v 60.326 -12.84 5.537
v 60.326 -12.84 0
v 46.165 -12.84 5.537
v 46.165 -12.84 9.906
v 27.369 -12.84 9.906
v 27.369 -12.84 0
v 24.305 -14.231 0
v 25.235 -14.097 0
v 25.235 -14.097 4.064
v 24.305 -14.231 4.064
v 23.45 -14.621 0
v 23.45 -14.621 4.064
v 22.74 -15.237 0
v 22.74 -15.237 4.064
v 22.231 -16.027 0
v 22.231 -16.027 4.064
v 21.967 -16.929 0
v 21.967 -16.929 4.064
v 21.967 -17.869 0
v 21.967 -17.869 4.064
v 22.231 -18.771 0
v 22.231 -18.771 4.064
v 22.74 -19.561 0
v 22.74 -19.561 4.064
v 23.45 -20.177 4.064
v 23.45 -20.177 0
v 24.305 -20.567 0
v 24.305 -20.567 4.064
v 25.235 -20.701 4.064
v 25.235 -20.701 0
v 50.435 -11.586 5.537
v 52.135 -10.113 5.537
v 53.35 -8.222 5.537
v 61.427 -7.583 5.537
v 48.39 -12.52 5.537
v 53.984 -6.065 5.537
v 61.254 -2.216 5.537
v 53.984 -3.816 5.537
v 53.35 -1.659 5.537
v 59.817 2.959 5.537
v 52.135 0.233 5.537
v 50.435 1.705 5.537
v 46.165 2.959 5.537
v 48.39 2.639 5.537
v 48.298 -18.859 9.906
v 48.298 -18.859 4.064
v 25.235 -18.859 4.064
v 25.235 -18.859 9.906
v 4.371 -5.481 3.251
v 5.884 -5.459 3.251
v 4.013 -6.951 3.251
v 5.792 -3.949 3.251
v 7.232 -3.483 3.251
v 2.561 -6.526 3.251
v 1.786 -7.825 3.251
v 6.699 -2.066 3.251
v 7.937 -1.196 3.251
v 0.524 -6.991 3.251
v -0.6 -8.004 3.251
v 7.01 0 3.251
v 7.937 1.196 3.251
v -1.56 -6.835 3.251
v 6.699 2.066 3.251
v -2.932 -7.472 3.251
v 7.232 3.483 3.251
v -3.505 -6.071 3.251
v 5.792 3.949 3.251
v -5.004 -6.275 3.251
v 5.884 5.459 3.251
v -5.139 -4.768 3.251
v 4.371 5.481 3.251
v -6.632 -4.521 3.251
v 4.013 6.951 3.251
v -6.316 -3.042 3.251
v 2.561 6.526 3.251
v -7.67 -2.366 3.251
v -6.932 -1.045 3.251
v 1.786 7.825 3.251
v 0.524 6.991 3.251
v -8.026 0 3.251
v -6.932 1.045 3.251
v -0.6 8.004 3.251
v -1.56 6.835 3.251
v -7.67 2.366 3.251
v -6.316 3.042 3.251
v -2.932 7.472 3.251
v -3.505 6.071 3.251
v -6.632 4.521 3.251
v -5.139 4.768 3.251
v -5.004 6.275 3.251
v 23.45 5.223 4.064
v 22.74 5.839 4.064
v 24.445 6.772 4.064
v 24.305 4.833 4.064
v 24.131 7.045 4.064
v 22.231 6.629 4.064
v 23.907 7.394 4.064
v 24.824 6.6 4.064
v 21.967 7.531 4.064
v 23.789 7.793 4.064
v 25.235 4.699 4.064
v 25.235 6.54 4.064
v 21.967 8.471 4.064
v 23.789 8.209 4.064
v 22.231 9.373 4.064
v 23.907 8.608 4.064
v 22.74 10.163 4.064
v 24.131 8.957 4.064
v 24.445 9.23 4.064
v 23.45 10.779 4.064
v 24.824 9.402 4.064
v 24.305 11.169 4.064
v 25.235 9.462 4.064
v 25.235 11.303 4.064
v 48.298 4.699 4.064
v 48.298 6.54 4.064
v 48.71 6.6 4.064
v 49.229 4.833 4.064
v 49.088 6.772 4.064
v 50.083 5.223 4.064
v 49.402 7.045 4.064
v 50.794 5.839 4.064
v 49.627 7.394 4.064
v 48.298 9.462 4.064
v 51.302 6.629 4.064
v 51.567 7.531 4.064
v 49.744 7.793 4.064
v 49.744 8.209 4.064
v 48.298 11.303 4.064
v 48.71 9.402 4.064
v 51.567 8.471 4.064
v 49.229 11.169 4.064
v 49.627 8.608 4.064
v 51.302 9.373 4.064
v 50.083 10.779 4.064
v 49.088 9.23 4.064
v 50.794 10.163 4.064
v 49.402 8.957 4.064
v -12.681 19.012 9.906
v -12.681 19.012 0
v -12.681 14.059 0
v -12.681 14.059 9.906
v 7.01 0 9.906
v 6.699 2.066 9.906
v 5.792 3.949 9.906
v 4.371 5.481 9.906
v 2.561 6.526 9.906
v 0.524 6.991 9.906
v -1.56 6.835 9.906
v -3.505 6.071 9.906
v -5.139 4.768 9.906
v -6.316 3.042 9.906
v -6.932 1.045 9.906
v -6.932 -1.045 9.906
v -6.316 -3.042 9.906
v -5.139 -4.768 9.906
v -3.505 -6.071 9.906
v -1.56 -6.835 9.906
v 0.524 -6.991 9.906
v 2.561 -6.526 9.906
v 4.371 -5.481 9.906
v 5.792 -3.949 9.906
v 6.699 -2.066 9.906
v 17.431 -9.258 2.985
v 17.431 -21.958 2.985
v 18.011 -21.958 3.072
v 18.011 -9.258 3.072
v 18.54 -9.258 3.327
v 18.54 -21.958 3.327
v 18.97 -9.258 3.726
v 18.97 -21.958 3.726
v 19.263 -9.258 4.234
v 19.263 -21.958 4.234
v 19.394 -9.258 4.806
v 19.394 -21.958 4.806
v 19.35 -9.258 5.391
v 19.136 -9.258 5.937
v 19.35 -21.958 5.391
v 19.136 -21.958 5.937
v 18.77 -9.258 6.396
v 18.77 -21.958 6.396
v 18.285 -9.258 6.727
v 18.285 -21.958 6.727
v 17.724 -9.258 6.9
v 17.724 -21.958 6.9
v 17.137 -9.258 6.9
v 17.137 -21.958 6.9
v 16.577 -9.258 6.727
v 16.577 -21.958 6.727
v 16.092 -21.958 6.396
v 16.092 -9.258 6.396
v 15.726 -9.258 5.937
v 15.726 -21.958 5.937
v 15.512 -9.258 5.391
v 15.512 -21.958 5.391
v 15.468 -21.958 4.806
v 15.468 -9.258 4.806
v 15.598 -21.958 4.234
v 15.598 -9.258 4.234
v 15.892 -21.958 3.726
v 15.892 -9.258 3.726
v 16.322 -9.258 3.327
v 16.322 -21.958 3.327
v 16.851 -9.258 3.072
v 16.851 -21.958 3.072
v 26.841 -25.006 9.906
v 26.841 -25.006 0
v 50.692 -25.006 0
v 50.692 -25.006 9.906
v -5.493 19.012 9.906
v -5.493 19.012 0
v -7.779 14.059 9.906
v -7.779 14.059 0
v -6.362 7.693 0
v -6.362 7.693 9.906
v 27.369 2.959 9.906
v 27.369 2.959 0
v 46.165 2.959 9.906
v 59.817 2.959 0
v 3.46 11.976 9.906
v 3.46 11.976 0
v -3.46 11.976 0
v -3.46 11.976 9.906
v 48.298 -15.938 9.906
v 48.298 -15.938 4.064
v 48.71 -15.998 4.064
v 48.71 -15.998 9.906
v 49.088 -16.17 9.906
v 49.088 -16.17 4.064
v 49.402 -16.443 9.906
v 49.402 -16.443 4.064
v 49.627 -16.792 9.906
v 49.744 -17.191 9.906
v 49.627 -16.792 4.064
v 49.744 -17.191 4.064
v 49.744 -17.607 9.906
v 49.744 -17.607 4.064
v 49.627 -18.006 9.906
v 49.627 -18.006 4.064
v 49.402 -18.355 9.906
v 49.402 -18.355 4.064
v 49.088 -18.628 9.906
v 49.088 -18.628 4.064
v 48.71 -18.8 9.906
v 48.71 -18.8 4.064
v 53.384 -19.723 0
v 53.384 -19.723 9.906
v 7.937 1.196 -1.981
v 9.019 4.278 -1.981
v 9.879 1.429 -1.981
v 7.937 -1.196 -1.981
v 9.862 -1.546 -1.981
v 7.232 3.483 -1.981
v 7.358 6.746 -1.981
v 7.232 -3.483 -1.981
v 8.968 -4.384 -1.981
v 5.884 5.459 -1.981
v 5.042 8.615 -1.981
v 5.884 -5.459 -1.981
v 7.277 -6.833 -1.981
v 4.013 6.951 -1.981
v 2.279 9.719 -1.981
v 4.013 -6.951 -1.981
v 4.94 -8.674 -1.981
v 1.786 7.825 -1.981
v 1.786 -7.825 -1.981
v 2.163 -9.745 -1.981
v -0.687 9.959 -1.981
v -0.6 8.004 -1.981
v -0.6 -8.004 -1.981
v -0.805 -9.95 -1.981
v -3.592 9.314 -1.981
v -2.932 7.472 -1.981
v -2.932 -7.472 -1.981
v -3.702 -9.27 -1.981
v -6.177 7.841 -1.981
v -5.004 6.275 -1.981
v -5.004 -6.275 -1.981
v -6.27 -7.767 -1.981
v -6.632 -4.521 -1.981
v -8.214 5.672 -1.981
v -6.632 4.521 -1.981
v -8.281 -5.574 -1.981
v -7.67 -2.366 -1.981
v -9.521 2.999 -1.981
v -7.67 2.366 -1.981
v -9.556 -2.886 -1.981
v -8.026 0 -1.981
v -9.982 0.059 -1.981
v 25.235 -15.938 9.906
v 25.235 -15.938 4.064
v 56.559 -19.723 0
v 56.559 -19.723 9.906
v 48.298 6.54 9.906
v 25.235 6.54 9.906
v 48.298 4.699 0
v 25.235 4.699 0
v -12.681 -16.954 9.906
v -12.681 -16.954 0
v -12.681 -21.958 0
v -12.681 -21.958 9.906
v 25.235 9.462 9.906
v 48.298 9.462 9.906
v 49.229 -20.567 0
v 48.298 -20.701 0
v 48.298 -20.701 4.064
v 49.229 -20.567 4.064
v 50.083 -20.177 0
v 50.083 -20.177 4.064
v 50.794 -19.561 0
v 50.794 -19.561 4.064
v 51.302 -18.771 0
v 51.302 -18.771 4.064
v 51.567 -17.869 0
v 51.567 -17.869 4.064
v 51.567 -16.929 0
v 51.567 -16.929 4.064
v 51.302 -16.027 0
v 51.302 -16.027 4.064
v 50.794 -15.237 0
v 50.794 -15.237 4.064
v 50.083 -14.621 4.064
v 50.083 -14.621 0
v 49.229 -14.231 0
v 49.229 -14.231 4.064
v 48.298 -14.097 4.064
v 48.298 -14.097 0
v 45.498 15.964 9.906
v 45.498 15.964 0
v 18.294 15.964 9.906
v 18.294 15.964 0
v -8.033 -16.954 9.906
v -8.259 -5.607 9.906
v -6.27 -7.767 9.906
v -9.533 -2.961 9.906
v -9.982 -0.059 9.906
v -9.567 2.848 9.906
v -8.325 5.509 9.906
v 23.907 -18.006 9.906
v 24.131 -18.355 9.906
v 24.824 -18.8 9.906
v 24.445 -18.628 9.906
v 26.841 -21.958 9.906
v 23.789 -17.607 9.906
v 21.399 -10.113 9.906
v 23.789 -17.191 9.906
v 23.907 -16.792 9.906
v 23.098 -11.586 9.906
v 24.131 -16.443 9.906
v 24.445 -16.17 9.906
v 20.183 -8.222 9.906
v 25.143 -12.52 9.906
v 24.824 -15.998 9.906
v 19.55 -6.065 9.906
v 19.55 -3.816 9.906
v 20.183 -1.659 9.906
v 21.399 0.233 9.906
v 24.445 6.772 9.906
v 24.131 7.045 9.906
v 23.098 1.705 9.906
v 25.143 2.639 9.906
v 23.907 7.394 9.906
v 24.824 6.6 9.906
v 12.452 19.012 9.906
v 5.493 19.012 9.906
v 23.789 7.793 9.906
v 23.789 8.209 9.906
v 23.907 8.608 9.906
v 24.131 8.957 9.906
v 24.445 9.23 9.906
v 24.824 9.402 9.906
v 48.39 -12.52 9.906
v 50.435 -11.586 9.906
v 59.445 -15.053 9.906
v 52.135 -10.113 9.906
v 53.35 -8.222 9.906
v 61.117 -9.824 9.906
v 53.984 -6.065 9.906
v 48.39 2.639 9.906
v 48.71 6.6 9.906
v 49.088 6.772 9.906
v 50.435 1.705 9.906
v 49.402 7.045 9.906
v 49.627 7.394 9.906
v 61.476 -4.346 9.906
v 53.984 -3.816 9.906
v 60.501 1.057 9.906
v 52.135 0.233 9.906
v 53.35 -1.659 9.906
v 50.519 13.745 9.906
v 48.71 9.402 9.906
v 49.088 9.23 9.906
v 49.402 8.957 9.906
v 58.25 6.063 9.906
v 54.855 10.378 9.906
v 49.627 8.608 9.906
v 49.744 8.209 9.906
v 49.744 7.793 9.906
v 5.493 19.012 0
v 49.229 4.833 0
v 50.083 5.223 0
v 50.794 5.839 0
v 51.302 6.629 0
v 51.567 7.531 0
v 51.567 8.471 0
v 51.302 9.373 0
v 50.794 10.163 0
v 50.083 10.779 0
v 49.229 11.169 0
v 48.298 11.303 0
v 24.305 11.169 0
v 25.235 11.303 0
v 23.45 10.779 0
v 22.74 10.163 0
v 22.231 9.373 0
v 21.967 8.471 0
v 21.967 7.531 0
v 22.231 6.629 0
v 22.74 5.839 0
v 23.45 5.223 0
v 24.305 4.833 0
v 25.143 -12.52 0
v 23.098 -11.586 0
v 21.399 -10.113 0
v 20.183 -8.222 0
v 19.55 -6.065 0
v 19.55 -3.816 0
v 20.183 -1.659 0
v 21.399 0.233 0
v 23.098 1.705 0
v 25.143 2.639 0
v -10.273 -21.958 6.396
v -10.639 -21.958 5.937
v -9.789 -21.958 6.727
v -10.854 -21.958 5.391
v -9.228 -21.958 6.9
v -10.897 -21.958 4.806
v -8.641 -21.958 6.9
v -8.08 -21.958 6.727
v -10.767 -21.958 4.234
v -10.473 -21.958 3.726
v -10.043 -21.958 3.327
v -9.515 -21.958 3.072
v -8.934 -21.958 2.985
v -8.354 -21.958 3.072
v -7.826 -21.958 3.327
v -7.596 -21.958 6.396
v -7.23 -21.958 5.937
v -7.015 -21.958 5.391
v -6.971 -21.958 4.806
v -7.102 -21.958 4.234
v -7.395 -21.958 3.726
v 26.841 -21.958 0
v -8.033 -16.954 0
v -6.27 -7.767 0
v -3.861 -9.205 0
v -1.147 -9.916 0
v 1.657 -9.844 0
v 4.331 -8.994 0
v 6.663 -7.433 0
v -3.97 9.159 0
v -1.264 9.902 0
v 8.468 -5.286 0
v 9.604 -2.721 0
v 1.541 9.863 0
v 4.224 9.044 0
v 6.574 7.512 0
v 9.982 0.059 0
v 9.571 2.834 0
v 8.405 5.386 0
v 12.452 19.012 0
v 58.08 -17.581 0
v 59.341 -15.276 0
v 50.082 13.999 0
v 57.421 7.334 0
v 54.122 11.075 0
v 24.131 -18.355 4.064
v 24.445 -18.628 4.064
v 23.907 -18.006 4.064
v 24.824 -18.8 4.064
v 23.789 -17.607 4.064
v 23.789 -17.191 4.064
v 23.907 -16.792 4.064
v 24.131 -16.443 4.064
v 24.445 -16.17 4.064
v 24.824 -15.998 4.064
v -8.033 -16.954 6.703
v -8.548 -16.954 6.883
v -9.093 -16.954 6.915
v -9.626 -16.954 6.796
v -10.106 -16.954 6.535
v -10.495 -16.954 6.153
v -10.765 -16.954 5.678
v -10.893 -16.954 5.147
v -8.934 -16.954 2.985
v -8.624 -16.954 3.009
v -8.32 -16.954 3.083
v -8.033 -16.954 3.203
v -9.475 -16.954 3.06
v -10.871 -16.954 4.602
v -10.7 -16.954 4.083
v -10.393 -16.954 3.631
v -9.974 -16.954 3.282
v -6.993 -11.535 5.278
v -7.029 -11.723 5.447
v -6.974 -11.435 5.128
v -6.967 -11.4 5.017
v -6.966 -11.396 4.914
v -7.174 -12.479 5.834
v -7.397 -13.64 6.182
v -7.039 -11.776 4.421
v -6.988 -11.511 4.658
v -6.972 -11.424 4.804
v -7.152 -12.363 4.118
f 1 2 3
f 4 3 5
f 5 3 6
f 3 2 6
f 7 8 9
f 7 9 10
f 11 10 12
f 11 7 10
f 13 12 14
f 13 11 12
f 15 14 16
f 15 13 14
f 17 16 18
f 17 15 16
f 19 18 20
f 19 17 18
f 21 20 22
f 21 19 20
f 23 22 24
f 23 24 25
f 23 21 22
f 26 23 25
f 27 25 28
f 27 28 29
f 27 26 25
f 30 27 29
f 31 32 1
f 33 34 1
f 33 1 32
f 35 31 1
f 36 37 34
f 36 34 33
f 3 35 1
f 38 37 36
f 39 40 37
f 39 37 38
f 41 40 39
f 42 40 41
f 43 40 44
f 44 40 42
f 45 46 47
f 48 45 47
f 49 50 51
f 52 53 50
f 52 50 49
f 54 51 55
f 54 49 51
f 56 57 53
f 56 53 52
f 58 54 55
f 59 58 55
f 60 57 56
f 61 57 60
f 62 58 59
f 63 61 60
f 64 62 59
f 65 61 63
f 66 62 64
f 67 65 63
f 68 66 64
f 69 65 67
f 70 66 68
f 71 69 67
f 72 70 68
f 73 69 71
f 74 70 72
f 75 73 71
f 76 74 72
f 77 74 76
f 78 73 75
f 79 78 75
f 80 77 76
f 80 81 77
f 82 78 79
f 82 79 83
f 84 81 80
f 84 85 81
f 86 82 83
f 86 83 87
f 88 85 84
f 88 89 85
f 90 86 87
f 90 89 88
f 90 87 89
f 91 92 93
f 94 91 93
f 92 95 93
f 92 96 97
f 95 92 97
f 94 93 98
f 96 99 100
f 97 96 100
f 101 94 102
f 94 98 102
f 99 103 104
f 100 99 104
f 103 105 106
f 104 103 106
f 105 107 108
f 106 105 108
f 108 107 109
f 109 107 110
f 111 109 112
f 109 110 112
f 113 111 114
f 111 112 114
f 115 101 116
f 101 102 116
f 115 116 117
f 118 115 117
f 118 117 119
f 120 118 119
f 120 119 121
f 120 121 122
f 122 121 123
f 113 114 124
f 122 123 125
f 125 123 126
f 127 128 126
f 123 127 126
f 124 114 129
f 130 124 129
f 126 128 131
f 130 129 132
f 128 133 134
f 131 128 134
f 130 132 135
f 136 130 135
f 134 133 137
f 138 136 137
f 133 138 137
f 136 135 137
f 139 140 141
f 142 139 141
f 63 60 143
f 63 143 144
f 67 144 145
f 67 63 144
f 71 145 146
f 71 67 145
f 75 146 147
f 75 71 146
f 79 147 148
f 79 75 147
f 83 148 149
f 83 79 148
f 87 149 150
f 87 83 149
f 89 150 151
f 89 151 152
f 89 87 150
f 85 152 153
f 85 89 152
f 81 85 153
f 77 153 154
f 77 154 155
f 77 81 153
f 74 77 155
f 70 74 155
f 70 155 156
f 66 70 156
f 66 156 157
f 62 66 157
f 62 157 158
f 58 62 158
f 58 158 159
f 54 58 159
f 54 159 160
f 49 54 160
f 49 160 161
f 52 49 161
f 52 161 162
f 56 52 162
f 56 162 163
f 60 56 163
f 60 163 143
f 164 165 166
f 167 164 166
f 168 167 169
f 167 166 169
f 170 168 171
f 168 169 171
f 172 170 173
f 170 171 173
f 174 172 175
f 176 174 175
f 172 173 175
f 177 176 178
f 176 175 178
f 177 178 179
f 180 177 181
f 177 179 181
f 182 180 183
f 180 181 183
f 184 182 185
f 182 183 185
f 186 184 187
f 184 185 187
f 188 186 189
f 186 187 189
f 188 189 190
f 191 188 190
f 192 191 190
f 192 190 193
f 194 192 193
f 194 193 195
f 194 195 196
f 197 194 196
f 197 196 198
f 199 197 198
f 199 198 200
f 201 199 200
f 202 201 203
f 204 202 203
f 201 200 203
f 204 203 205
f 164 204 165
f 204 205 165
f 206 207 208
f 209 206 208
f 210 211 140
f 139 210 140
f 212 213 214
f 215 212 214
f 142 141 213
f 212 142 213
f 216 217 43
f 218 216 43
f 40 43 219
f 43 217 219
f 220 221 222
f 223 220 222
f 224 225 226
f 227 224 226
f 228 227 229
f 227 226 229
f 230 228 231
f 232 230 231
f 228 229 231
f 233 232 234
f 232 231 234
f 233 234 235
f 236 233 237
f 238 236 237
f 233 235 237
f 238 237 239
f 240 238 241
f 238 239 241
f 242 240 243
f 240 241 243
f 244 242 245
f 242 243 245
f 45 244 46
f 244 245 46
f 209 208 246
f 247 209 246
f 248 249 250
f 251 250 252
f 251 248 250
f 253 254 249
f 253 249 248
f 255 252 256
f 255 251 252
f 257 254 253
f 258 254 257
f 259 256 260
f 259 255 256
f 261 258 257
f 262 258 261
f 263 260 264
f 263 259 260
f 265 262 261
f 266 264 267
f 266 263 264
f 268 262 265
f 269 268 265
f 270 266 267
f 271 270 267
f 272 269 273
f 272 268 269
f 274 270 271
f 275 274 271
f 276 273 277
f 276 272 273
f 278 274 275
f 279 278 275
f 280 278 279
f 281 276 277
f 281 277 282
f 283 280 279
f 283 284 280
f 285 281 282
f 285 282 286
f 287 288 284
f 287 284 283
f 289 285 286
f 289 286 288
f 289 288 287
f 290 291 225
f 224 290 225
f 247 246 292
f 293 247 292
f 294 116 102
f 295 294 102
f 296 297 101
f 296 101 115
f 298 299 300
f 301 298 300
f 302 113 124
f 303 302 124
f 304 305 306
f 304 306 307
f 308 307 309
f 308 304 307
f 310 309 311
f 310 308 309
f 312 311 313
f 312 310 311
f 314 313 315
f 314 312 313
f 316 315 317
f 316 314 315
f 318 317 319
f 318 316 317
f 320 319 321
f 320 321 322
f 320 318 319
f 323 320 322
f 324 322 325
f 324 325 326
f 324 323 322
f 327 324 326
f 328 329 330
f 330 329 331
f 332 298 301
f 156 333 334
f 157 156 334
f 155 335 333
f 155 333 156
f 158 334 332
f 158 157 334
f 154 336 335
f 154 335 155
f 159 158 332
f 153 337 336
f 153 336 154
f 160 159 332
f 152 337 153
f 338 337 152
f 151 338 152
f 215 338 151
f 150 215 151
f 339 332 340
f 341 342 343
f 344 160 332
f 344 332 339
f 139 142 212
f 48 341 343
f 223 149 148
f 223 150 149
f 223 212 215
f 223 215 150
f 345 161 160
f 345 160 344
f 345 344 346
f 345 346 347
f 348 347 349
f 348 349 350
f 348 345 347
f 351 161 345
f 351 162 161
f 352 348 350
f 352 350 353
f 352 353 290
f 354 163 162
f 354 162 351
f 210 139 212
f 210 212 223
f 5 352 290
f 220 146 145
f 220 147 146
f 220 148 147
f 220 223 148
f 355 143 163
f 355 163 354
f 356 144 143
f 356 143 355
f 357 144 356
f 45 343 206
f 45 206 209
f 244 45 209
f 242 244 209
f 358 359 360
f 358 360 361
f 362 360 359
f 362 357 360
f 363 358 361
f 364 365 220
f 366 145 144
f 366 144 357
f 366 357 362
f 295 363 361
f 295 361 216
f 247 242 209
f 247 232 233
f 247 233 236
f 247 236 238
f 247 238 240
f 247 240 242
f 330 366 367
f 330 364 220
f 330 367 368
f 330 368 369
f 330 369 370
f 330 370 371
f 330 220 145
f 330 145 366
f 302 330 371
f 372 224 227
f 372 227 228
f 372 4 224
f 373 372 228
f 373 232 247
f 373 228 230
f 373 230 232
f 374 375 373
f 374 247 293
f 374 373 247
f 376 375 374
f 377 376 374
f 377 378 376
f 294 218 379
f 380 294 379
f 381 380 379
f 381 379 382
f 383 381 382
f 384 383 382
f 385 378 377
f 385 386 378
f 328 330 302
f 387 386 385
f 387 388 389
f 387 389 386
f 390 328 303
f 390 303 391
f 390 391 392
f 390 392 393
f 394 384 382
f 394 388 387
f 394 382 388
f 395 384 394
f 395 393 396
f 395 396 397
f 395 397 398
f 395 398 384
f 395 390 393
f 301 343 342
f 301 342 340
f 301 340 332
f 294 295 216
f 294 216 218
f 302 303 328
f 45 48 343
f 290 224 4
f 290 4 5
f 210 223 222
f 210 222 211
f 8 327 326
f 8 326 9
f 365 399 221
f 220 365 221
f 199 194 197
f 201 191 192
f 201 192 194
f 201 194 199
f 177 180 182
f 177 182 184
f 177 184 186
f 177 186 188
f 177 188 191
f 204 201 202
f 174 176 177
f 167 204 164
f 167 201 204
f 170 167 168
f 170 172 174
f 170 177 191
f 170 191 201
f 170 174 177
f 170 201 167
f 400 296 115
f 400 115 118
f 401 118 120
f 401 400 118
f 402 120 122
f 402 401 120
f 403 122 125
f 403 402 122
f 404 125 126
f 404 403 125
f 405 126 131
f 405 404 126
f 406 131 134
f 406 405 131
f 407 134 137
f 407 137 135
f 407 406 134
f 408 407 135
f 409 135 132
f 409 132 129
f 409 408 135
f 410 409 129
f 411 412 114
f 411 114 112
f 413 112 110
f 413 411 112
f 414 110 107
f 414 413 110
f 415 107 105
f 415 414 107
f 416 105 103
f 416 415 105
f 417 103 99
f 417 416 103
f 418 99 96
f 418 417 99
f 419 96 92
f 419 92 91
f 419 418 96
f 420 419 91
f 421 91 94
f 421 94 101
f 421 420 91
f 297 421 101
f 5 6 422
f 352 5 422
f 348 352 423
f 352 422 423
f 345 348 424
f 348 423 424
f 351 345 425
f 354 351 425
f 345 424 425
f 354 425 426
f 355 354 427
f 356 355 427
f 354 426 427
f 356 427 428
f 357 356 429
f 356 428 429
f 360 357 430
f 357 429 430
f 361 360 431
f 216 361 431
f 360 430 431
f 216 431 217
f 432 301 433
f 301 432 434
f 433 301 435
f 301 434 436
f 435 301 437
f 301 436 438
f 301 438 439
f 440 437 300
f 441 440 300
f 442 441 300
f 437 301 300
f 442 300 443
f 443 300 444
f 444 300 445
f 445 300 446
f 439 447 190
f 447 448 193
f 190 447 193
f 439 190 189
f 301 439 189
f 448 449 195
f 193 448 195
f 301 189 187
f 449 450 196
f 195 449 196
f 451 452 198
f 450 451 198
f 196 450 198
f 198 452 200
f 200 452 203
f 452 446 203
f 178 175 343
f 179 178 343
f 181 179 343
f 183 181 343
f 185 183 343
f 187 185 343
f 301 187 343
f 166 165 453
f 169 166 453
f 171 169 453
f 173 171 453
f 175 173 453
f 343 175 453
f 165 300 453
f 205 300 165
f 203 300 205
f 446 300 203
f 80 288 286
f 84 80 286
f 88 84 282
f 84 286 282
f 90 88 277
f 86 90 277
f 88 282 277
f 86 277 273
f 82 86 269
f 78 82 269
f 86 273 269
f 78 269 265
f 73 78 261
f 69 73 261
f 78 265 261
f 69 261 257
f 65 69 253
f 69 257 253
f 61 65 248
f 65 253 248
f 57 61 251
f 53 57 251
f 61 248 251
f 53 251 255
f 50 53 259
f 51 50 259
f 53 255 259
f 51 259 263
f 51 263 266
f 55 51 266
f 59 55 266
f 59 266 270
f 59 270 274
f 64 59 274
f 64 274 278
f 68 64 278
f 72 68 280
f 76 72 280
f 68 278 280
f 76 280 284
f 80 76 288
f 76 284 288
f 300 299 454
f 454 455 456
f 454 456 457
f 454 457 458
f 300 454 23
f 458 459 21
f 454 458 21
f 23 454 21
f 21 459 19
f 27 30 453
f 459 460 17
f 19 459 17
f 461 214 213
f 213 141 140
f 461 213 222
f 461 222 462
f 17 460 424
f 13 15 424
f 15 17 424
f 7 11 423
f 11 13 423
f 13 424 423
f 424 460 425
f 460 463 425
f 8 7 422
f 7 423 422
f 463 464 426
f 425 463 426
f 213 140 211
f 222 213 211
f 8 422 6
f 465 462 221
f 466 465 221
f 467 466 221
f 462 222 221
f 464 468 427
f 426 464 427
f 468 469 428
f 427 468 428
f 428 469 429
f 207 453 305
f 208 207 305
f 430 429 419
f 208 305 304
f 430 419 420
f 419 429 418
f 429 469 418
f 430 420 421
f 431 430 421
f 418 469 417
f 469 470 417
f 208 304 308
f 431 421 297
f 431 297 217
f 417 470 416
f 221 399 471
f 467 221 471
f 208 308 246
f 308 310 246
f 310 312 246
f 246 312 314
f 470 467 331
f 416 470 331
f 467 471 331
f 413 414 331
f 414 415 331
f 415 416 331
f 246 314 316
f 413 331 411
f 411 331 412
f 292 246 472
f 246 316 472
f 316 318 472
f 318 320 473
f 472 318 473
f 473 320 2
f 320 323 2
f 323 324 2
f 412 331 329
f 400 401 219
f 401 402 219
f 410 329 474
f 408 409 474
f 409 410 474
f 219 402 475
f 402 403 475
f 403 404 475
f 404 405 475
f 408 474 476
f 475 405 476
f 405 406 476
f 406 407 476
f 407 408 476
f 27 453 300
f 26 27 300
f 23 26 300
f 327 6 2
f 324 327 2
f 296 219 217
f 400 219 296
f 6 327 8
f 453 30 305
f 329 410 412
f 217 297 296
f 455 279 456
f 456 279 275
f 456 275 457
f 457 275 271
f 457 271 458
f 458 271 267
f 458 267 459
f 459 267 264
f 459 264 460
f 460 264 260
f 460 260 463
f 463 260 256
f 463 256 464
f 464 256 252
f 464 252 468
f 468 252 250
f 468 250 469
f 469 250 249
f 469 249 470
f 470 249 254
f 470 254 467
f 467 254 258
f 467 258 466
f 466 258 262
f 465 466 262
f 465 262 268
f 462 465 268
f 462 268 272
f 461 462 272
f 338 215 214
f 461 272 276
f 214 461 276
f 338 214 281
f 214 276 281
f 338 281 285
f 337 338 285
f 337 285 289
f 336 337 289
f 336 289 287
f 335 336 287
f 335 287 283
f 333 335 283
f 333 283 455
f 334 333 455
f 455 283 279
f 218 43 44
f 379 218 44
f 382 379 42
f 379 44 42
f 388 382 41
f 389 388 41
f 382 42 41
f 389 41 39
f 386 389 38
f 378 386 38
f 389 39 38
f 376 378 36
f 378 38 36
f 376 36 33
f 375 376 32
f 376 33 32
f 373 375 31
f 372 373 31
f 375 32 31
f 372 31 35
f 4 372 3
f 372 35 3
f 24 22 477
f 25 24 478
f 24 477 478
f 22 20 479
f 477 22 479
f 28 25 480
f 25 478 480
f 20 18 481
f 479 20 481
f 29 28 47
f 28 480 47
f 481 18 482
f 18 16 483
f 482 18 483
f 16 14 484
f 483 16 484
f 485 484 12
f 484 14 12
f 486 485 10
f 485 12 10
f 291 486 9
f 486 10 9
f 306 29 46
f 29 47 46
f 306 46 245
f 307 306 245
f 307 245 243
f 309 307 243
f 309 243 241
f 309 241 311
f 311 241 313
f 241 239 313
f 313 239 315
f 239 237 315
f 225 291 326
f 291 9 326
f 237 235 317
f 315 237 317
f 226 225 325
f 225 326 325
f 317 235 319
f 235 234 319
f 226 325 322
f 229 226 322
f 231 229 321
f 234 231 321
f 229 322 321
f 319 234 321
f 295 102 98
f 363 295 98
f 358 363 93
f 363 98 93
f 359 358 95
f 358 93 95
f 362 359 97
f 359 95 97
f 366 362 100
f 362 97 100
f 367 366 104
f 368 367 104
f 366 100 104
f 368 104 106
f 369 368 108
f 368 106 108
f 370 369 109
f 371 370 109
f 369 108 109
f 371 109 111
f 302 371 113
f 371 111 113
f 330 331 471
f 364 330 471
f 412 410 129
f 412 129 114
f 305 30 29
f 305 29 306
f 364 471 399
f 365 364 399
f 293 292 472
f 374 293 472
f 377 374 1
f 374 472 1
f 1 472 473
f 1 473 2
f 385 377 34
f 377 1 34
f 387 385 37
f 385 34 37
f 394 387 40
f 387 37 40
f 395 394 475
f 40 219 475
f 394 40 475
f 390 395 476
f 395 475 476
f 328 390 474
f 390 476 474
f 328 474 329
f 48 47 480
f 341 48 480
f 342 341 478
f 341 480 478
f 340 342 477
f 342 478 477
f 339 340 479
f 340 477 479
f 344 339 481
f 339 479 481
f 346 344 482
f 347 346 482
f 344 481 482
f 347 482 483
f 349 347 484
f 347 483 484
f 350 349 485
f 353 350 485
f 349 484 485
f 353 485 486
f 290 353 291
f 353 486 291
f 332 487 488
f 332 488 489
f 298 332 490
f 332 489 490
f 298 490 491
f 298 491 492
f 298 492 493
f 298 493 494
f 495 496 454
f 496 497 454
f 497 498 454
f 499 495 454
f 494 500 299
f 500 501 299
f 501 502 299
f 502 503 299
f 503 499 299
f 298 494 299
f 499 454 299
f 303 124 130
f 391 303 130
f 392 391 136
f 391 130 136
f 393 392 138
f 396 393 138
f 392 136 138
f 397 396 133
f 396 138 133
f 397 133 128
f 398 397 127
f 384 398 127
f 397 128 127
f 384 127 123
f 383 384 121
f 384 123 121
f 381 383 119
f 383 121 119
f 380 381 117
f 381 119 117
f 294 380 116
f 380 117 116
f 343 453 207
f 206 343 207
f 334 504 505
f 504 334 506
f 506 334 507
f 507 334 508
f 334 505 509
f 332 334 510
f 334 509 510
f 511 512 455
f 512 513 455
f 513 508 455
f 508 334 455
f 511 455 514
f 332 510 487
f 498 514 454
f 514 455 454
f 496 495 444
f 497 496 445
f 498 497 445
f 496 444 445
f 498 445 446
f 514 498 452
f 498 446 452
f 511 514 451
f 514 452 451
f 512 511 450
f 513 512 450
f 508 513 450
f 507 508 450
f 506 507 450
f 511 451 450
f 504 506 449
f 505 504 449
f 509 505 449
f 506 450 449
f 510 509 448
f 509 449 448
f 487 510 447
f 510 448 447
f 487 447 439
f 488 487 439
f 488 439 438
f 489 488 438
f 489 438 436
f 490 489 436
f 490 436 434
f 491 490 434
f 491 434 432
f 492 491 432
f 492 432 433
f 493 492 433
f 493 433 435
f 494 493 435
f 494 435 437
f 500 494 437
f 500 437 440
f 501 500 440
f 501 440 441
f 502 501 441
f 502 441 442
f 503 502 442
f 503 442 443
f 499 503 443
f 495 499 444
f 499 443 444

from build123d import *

# Parameters (mm, degrees)
SKETCH1_R           = 7.0231
SKETCH1_R_2         = 7.0104
BOSS_EXTRUDE2_DEPTH = 9.906
SKETCH2_R           = 9.9822
SKETCH2_R_2         = 4.98475
BOSS_EXTRUDE3_DEPTH = 1.9812
SKETCH4_R           = 9.9822
SKETCH4_R_2         = 7.0231
BOSS_EXTRUDE4_DEPTH = 9.906
SKETCH5_R           = 8.0264
CUT_EXTRUDE1_DEPTH  = 5.2324
CUT_EXTRUDE2_DEPTH  = 5.5372
SKETCH7_R           = 1.9685
CUT_EXTRUDE3_DEPTH  = 12.7
CUT_EXTRUDE4_DEPTH  = 4.064


with BuildPart() as part:
    # Sketch1 → Boss-Extrude2 (new body)
    # profile 1 of 2: a face of its own
    with BuildSketch(Plane.XY):
        with BuildLine():
            Line((-7.77875, 14.0589), (-5.59435, 4.245842871))
            ThreePointArc((-5.59435, 4.245842871), (2.239894431, 6.65633582), (7.0231, 0))
            ThreePointArc((7.0231, 0), (2.239894431, -6.65633582), (-5.59435, -4.245842871))
            Line((-5.59435, -4.245842871), (-8.03275, -16.9545))
            Line((-8.03275, -16.9545), (-12.68095, -16.9545))
            Line((-12.68095, -16.9545), (-12.68095, -21.9583))
            Line((-12.68095, -21.9583), (26.84145, -21.9583))
            Line((26.84145, -21.9583), (26.84145, -25.0063))
            Line((26.84145, -25.0063), (50.69205, -25.0063))
            Line((50.69205, -25.0063), (53.38445, -19.7231))
            Line((53.38445, -19.7231), (56.55945, -19.7231))
            ThreePointArc((56.55945, -19.7231), (60.50132397, 1.056607323), (45.49775, 15.9639))
            Line((45.49775, 15.9639), (18.29435, 15.9639))
            Line((18.29435, 15.9639), (12.45235, 19.0119))
            Line((12.45235, 19.0119), (5.49275, 19.0119))
            Line((5.49275, 19.0119), (3.460028891, 11.9761))
            Line((3.460028891, 11.9761), (-3.460028891, 11.9761))
            Line((-3.460028891, 11.9761), (-5.49275, 19.0119))
            Line((-5.49275, 19.0119), (-12.68095, 19.0119))
            Line((-12.68095, 19.0119), (-12.68095, 14.0589))
            Line((-12.68095, 14.0589), (-7.77875, 14.0589))
        make_face()
        with BuildLine():
            ThreePointArc((25.235083599, -18.8595), (23.774583599, -17.399), (25.235083599, -15.9385))
            Line((25.235083599, -15.9385), (48.298283599, -15.9385))
            ThreePointArc((48.298283599, -15.9385), (49.758783599, -17.399), (48.298283599, -18.8595))
            Line((48.298283599, -18.8595), (25.235083599, -18.8595))
        make_face(mode=Mode.SUBTRACT)
        with BuildLine():
            ThreePointArc((27.368683599, -12.8397), (19.469283599, -4.9403), (27.368683599, 2.9591))
            Line((27.368683599, 2.9591), (46.164683599, 2.9591))
            ThreePointArc((46.164683599, 2.9591), (54.064083599, -4.9403), (46.164683599, -12.8397))
            Line((46.164683599, -12.8397), (27.368683599, -12.8397))
        make_face(mode=Mode.SUBTRACT)
        with BuildLine():
            ThreePointArc((25.235083599, 6.5405), (23.774583599, 8.001), (25.235083599, 9.4615))
            Line((25.235083599, 9.4615), (48.298283599, 9.4615))
            ThreePointArc((48.298283599, 9.4615), (49.758783599, 8.001), (48.298283599, 6.5405))
            Line((48.298283599, 6.5405), (25.235083599, 6.5405))
        make_face(mode=Mode.SUBTRACT)
    # profile 2 of 2: a face of its own
    with BuildSketch(Plane.XY):
        Circle(SKETCH1_R)
        Circle(SKETCH1_R_2, mode=Mode.SUBTRACT)
    extrude(amount=BOSS_EXTRUDE2_DEPTH)

    # Sketch2 → Boss-Extrude3 (add)
    with BuildSketch(Plane(origin=(0, 0, 0), x_dir=(-1, 0, 0), z_dir=(0, 0, -1))):
        with Locations(Location((0, 0, 0), (0, 0, 308.91150739))):
            Circle(SKETCH2_R)
        Circle(SKETCH2_R_2, mode=Mode.SUBTRACT)
    extrude(amount=BOSS_EXTRUDE3_DEPTH)

    # Sketch4 → Boss-Extrude4 (add)
    with BuildSketch(Plane.XY):
        with Locations(Location((0, 0, 0), (0, 0, 231.08849261))):
            Circle(SKETCH4_R)
        Circle(SKETCH4_R_2, mode=Mode.SUBTRACT)
    extrude(amount=BOSS_EXTRUDE4_DEPTH)

    # Sketch5 → Cut-Extrude1 (cut)
    with BuildSketch(Plane(origin=(0, 0, -1.9812), x_dir=(-1, 0, 0), z_dir=(0, 0, -1))):
        Circle(SKETCH5_R)
    extrude(amount=-CUT_EXTRUDE1_DEPTH, mode=Mode.SUBTRACT)

    # Sketch6 → Cut-Extrude2 (cut)
    with BuildSketch(Plane(origin=(0, 0, 0), x_dir=(-1, 0, 0), z_dir=(0, 0, -1))):
        with BuildLine():
            Line((-46.164683599, 2.9591), (-59.816731187, 2.9591))
            ThreePointArc((-59.816731187, 2.9591), (-61.500748438, -4.894234845), (-60.325858759, -12.8397))
            Line((-60.325858759, -12.8397), (-46.164683599, -12.8397))
            Line((-46.164683599, -12.8397), (-46.164683599, 2.9591))
        make_face()
    extrude(amount=-CUT_EXTRUDE2_DEPTH, mode=Mode.SUBTRACT)

    # Sketch7 → Cut-Extrude3 (cut)
    with BuildSketch(Plane.XZ.offset(21.9583)):
        with Locations(Location((-8.93445, 4.953, 0), (0, 0, 270))):
            Circle(SKETCH7_R)
        with Locations(Location((17.43075, 4.953, 0), (0, 0, 270))):
            Circle(SKETCH7_R)
    extrude(amount=-CUT_EXTRUDE3_DEPTH, mode=Mode.SUBTRACT)

    # Sketch8 → Cut-Extrude4 (cut)
    with BuildSketch(Plane(origin=(0, 0, 0), x_dir=(-1, 0, 0), z_dir=(0, 0, -1))):
        with BuildLine():
            Line((-48.298283599, 11.303), (-25.235083599, 11.303))
            ThreePointArc((-25.235083599, 11.303), (-21.933083599, 8.001), (-25.235083599, 4.699))
            Line((-25.235083599, 4.699), (-48.298283599, 4.699))
            ThreePointArc((-48.298283599, 4.699), (-51.600283599, 8.001), (-48.298283599, 11.303))
        make_face()
        with BuildLine():
            Line((-48.298283599, -14.097), (-25.235083599, -14.097))
            ThreePointArc((-25.235083599, -14.097), (-21.933083599, -17.399), (-25.235083599, -20.701))
            Line((-25.235083599, -20.701), (-48.298283599, -20.701))
            ThreePointArc((-48.298283599, -20.701), (-51.600283599, -17.399), (-48.298283599, -14.097))
        make_face()
    extrude(amount=-CUT_EXTRUDE4_DEPTH, mode=Mode.SUBTRACT)


solid = part.part
